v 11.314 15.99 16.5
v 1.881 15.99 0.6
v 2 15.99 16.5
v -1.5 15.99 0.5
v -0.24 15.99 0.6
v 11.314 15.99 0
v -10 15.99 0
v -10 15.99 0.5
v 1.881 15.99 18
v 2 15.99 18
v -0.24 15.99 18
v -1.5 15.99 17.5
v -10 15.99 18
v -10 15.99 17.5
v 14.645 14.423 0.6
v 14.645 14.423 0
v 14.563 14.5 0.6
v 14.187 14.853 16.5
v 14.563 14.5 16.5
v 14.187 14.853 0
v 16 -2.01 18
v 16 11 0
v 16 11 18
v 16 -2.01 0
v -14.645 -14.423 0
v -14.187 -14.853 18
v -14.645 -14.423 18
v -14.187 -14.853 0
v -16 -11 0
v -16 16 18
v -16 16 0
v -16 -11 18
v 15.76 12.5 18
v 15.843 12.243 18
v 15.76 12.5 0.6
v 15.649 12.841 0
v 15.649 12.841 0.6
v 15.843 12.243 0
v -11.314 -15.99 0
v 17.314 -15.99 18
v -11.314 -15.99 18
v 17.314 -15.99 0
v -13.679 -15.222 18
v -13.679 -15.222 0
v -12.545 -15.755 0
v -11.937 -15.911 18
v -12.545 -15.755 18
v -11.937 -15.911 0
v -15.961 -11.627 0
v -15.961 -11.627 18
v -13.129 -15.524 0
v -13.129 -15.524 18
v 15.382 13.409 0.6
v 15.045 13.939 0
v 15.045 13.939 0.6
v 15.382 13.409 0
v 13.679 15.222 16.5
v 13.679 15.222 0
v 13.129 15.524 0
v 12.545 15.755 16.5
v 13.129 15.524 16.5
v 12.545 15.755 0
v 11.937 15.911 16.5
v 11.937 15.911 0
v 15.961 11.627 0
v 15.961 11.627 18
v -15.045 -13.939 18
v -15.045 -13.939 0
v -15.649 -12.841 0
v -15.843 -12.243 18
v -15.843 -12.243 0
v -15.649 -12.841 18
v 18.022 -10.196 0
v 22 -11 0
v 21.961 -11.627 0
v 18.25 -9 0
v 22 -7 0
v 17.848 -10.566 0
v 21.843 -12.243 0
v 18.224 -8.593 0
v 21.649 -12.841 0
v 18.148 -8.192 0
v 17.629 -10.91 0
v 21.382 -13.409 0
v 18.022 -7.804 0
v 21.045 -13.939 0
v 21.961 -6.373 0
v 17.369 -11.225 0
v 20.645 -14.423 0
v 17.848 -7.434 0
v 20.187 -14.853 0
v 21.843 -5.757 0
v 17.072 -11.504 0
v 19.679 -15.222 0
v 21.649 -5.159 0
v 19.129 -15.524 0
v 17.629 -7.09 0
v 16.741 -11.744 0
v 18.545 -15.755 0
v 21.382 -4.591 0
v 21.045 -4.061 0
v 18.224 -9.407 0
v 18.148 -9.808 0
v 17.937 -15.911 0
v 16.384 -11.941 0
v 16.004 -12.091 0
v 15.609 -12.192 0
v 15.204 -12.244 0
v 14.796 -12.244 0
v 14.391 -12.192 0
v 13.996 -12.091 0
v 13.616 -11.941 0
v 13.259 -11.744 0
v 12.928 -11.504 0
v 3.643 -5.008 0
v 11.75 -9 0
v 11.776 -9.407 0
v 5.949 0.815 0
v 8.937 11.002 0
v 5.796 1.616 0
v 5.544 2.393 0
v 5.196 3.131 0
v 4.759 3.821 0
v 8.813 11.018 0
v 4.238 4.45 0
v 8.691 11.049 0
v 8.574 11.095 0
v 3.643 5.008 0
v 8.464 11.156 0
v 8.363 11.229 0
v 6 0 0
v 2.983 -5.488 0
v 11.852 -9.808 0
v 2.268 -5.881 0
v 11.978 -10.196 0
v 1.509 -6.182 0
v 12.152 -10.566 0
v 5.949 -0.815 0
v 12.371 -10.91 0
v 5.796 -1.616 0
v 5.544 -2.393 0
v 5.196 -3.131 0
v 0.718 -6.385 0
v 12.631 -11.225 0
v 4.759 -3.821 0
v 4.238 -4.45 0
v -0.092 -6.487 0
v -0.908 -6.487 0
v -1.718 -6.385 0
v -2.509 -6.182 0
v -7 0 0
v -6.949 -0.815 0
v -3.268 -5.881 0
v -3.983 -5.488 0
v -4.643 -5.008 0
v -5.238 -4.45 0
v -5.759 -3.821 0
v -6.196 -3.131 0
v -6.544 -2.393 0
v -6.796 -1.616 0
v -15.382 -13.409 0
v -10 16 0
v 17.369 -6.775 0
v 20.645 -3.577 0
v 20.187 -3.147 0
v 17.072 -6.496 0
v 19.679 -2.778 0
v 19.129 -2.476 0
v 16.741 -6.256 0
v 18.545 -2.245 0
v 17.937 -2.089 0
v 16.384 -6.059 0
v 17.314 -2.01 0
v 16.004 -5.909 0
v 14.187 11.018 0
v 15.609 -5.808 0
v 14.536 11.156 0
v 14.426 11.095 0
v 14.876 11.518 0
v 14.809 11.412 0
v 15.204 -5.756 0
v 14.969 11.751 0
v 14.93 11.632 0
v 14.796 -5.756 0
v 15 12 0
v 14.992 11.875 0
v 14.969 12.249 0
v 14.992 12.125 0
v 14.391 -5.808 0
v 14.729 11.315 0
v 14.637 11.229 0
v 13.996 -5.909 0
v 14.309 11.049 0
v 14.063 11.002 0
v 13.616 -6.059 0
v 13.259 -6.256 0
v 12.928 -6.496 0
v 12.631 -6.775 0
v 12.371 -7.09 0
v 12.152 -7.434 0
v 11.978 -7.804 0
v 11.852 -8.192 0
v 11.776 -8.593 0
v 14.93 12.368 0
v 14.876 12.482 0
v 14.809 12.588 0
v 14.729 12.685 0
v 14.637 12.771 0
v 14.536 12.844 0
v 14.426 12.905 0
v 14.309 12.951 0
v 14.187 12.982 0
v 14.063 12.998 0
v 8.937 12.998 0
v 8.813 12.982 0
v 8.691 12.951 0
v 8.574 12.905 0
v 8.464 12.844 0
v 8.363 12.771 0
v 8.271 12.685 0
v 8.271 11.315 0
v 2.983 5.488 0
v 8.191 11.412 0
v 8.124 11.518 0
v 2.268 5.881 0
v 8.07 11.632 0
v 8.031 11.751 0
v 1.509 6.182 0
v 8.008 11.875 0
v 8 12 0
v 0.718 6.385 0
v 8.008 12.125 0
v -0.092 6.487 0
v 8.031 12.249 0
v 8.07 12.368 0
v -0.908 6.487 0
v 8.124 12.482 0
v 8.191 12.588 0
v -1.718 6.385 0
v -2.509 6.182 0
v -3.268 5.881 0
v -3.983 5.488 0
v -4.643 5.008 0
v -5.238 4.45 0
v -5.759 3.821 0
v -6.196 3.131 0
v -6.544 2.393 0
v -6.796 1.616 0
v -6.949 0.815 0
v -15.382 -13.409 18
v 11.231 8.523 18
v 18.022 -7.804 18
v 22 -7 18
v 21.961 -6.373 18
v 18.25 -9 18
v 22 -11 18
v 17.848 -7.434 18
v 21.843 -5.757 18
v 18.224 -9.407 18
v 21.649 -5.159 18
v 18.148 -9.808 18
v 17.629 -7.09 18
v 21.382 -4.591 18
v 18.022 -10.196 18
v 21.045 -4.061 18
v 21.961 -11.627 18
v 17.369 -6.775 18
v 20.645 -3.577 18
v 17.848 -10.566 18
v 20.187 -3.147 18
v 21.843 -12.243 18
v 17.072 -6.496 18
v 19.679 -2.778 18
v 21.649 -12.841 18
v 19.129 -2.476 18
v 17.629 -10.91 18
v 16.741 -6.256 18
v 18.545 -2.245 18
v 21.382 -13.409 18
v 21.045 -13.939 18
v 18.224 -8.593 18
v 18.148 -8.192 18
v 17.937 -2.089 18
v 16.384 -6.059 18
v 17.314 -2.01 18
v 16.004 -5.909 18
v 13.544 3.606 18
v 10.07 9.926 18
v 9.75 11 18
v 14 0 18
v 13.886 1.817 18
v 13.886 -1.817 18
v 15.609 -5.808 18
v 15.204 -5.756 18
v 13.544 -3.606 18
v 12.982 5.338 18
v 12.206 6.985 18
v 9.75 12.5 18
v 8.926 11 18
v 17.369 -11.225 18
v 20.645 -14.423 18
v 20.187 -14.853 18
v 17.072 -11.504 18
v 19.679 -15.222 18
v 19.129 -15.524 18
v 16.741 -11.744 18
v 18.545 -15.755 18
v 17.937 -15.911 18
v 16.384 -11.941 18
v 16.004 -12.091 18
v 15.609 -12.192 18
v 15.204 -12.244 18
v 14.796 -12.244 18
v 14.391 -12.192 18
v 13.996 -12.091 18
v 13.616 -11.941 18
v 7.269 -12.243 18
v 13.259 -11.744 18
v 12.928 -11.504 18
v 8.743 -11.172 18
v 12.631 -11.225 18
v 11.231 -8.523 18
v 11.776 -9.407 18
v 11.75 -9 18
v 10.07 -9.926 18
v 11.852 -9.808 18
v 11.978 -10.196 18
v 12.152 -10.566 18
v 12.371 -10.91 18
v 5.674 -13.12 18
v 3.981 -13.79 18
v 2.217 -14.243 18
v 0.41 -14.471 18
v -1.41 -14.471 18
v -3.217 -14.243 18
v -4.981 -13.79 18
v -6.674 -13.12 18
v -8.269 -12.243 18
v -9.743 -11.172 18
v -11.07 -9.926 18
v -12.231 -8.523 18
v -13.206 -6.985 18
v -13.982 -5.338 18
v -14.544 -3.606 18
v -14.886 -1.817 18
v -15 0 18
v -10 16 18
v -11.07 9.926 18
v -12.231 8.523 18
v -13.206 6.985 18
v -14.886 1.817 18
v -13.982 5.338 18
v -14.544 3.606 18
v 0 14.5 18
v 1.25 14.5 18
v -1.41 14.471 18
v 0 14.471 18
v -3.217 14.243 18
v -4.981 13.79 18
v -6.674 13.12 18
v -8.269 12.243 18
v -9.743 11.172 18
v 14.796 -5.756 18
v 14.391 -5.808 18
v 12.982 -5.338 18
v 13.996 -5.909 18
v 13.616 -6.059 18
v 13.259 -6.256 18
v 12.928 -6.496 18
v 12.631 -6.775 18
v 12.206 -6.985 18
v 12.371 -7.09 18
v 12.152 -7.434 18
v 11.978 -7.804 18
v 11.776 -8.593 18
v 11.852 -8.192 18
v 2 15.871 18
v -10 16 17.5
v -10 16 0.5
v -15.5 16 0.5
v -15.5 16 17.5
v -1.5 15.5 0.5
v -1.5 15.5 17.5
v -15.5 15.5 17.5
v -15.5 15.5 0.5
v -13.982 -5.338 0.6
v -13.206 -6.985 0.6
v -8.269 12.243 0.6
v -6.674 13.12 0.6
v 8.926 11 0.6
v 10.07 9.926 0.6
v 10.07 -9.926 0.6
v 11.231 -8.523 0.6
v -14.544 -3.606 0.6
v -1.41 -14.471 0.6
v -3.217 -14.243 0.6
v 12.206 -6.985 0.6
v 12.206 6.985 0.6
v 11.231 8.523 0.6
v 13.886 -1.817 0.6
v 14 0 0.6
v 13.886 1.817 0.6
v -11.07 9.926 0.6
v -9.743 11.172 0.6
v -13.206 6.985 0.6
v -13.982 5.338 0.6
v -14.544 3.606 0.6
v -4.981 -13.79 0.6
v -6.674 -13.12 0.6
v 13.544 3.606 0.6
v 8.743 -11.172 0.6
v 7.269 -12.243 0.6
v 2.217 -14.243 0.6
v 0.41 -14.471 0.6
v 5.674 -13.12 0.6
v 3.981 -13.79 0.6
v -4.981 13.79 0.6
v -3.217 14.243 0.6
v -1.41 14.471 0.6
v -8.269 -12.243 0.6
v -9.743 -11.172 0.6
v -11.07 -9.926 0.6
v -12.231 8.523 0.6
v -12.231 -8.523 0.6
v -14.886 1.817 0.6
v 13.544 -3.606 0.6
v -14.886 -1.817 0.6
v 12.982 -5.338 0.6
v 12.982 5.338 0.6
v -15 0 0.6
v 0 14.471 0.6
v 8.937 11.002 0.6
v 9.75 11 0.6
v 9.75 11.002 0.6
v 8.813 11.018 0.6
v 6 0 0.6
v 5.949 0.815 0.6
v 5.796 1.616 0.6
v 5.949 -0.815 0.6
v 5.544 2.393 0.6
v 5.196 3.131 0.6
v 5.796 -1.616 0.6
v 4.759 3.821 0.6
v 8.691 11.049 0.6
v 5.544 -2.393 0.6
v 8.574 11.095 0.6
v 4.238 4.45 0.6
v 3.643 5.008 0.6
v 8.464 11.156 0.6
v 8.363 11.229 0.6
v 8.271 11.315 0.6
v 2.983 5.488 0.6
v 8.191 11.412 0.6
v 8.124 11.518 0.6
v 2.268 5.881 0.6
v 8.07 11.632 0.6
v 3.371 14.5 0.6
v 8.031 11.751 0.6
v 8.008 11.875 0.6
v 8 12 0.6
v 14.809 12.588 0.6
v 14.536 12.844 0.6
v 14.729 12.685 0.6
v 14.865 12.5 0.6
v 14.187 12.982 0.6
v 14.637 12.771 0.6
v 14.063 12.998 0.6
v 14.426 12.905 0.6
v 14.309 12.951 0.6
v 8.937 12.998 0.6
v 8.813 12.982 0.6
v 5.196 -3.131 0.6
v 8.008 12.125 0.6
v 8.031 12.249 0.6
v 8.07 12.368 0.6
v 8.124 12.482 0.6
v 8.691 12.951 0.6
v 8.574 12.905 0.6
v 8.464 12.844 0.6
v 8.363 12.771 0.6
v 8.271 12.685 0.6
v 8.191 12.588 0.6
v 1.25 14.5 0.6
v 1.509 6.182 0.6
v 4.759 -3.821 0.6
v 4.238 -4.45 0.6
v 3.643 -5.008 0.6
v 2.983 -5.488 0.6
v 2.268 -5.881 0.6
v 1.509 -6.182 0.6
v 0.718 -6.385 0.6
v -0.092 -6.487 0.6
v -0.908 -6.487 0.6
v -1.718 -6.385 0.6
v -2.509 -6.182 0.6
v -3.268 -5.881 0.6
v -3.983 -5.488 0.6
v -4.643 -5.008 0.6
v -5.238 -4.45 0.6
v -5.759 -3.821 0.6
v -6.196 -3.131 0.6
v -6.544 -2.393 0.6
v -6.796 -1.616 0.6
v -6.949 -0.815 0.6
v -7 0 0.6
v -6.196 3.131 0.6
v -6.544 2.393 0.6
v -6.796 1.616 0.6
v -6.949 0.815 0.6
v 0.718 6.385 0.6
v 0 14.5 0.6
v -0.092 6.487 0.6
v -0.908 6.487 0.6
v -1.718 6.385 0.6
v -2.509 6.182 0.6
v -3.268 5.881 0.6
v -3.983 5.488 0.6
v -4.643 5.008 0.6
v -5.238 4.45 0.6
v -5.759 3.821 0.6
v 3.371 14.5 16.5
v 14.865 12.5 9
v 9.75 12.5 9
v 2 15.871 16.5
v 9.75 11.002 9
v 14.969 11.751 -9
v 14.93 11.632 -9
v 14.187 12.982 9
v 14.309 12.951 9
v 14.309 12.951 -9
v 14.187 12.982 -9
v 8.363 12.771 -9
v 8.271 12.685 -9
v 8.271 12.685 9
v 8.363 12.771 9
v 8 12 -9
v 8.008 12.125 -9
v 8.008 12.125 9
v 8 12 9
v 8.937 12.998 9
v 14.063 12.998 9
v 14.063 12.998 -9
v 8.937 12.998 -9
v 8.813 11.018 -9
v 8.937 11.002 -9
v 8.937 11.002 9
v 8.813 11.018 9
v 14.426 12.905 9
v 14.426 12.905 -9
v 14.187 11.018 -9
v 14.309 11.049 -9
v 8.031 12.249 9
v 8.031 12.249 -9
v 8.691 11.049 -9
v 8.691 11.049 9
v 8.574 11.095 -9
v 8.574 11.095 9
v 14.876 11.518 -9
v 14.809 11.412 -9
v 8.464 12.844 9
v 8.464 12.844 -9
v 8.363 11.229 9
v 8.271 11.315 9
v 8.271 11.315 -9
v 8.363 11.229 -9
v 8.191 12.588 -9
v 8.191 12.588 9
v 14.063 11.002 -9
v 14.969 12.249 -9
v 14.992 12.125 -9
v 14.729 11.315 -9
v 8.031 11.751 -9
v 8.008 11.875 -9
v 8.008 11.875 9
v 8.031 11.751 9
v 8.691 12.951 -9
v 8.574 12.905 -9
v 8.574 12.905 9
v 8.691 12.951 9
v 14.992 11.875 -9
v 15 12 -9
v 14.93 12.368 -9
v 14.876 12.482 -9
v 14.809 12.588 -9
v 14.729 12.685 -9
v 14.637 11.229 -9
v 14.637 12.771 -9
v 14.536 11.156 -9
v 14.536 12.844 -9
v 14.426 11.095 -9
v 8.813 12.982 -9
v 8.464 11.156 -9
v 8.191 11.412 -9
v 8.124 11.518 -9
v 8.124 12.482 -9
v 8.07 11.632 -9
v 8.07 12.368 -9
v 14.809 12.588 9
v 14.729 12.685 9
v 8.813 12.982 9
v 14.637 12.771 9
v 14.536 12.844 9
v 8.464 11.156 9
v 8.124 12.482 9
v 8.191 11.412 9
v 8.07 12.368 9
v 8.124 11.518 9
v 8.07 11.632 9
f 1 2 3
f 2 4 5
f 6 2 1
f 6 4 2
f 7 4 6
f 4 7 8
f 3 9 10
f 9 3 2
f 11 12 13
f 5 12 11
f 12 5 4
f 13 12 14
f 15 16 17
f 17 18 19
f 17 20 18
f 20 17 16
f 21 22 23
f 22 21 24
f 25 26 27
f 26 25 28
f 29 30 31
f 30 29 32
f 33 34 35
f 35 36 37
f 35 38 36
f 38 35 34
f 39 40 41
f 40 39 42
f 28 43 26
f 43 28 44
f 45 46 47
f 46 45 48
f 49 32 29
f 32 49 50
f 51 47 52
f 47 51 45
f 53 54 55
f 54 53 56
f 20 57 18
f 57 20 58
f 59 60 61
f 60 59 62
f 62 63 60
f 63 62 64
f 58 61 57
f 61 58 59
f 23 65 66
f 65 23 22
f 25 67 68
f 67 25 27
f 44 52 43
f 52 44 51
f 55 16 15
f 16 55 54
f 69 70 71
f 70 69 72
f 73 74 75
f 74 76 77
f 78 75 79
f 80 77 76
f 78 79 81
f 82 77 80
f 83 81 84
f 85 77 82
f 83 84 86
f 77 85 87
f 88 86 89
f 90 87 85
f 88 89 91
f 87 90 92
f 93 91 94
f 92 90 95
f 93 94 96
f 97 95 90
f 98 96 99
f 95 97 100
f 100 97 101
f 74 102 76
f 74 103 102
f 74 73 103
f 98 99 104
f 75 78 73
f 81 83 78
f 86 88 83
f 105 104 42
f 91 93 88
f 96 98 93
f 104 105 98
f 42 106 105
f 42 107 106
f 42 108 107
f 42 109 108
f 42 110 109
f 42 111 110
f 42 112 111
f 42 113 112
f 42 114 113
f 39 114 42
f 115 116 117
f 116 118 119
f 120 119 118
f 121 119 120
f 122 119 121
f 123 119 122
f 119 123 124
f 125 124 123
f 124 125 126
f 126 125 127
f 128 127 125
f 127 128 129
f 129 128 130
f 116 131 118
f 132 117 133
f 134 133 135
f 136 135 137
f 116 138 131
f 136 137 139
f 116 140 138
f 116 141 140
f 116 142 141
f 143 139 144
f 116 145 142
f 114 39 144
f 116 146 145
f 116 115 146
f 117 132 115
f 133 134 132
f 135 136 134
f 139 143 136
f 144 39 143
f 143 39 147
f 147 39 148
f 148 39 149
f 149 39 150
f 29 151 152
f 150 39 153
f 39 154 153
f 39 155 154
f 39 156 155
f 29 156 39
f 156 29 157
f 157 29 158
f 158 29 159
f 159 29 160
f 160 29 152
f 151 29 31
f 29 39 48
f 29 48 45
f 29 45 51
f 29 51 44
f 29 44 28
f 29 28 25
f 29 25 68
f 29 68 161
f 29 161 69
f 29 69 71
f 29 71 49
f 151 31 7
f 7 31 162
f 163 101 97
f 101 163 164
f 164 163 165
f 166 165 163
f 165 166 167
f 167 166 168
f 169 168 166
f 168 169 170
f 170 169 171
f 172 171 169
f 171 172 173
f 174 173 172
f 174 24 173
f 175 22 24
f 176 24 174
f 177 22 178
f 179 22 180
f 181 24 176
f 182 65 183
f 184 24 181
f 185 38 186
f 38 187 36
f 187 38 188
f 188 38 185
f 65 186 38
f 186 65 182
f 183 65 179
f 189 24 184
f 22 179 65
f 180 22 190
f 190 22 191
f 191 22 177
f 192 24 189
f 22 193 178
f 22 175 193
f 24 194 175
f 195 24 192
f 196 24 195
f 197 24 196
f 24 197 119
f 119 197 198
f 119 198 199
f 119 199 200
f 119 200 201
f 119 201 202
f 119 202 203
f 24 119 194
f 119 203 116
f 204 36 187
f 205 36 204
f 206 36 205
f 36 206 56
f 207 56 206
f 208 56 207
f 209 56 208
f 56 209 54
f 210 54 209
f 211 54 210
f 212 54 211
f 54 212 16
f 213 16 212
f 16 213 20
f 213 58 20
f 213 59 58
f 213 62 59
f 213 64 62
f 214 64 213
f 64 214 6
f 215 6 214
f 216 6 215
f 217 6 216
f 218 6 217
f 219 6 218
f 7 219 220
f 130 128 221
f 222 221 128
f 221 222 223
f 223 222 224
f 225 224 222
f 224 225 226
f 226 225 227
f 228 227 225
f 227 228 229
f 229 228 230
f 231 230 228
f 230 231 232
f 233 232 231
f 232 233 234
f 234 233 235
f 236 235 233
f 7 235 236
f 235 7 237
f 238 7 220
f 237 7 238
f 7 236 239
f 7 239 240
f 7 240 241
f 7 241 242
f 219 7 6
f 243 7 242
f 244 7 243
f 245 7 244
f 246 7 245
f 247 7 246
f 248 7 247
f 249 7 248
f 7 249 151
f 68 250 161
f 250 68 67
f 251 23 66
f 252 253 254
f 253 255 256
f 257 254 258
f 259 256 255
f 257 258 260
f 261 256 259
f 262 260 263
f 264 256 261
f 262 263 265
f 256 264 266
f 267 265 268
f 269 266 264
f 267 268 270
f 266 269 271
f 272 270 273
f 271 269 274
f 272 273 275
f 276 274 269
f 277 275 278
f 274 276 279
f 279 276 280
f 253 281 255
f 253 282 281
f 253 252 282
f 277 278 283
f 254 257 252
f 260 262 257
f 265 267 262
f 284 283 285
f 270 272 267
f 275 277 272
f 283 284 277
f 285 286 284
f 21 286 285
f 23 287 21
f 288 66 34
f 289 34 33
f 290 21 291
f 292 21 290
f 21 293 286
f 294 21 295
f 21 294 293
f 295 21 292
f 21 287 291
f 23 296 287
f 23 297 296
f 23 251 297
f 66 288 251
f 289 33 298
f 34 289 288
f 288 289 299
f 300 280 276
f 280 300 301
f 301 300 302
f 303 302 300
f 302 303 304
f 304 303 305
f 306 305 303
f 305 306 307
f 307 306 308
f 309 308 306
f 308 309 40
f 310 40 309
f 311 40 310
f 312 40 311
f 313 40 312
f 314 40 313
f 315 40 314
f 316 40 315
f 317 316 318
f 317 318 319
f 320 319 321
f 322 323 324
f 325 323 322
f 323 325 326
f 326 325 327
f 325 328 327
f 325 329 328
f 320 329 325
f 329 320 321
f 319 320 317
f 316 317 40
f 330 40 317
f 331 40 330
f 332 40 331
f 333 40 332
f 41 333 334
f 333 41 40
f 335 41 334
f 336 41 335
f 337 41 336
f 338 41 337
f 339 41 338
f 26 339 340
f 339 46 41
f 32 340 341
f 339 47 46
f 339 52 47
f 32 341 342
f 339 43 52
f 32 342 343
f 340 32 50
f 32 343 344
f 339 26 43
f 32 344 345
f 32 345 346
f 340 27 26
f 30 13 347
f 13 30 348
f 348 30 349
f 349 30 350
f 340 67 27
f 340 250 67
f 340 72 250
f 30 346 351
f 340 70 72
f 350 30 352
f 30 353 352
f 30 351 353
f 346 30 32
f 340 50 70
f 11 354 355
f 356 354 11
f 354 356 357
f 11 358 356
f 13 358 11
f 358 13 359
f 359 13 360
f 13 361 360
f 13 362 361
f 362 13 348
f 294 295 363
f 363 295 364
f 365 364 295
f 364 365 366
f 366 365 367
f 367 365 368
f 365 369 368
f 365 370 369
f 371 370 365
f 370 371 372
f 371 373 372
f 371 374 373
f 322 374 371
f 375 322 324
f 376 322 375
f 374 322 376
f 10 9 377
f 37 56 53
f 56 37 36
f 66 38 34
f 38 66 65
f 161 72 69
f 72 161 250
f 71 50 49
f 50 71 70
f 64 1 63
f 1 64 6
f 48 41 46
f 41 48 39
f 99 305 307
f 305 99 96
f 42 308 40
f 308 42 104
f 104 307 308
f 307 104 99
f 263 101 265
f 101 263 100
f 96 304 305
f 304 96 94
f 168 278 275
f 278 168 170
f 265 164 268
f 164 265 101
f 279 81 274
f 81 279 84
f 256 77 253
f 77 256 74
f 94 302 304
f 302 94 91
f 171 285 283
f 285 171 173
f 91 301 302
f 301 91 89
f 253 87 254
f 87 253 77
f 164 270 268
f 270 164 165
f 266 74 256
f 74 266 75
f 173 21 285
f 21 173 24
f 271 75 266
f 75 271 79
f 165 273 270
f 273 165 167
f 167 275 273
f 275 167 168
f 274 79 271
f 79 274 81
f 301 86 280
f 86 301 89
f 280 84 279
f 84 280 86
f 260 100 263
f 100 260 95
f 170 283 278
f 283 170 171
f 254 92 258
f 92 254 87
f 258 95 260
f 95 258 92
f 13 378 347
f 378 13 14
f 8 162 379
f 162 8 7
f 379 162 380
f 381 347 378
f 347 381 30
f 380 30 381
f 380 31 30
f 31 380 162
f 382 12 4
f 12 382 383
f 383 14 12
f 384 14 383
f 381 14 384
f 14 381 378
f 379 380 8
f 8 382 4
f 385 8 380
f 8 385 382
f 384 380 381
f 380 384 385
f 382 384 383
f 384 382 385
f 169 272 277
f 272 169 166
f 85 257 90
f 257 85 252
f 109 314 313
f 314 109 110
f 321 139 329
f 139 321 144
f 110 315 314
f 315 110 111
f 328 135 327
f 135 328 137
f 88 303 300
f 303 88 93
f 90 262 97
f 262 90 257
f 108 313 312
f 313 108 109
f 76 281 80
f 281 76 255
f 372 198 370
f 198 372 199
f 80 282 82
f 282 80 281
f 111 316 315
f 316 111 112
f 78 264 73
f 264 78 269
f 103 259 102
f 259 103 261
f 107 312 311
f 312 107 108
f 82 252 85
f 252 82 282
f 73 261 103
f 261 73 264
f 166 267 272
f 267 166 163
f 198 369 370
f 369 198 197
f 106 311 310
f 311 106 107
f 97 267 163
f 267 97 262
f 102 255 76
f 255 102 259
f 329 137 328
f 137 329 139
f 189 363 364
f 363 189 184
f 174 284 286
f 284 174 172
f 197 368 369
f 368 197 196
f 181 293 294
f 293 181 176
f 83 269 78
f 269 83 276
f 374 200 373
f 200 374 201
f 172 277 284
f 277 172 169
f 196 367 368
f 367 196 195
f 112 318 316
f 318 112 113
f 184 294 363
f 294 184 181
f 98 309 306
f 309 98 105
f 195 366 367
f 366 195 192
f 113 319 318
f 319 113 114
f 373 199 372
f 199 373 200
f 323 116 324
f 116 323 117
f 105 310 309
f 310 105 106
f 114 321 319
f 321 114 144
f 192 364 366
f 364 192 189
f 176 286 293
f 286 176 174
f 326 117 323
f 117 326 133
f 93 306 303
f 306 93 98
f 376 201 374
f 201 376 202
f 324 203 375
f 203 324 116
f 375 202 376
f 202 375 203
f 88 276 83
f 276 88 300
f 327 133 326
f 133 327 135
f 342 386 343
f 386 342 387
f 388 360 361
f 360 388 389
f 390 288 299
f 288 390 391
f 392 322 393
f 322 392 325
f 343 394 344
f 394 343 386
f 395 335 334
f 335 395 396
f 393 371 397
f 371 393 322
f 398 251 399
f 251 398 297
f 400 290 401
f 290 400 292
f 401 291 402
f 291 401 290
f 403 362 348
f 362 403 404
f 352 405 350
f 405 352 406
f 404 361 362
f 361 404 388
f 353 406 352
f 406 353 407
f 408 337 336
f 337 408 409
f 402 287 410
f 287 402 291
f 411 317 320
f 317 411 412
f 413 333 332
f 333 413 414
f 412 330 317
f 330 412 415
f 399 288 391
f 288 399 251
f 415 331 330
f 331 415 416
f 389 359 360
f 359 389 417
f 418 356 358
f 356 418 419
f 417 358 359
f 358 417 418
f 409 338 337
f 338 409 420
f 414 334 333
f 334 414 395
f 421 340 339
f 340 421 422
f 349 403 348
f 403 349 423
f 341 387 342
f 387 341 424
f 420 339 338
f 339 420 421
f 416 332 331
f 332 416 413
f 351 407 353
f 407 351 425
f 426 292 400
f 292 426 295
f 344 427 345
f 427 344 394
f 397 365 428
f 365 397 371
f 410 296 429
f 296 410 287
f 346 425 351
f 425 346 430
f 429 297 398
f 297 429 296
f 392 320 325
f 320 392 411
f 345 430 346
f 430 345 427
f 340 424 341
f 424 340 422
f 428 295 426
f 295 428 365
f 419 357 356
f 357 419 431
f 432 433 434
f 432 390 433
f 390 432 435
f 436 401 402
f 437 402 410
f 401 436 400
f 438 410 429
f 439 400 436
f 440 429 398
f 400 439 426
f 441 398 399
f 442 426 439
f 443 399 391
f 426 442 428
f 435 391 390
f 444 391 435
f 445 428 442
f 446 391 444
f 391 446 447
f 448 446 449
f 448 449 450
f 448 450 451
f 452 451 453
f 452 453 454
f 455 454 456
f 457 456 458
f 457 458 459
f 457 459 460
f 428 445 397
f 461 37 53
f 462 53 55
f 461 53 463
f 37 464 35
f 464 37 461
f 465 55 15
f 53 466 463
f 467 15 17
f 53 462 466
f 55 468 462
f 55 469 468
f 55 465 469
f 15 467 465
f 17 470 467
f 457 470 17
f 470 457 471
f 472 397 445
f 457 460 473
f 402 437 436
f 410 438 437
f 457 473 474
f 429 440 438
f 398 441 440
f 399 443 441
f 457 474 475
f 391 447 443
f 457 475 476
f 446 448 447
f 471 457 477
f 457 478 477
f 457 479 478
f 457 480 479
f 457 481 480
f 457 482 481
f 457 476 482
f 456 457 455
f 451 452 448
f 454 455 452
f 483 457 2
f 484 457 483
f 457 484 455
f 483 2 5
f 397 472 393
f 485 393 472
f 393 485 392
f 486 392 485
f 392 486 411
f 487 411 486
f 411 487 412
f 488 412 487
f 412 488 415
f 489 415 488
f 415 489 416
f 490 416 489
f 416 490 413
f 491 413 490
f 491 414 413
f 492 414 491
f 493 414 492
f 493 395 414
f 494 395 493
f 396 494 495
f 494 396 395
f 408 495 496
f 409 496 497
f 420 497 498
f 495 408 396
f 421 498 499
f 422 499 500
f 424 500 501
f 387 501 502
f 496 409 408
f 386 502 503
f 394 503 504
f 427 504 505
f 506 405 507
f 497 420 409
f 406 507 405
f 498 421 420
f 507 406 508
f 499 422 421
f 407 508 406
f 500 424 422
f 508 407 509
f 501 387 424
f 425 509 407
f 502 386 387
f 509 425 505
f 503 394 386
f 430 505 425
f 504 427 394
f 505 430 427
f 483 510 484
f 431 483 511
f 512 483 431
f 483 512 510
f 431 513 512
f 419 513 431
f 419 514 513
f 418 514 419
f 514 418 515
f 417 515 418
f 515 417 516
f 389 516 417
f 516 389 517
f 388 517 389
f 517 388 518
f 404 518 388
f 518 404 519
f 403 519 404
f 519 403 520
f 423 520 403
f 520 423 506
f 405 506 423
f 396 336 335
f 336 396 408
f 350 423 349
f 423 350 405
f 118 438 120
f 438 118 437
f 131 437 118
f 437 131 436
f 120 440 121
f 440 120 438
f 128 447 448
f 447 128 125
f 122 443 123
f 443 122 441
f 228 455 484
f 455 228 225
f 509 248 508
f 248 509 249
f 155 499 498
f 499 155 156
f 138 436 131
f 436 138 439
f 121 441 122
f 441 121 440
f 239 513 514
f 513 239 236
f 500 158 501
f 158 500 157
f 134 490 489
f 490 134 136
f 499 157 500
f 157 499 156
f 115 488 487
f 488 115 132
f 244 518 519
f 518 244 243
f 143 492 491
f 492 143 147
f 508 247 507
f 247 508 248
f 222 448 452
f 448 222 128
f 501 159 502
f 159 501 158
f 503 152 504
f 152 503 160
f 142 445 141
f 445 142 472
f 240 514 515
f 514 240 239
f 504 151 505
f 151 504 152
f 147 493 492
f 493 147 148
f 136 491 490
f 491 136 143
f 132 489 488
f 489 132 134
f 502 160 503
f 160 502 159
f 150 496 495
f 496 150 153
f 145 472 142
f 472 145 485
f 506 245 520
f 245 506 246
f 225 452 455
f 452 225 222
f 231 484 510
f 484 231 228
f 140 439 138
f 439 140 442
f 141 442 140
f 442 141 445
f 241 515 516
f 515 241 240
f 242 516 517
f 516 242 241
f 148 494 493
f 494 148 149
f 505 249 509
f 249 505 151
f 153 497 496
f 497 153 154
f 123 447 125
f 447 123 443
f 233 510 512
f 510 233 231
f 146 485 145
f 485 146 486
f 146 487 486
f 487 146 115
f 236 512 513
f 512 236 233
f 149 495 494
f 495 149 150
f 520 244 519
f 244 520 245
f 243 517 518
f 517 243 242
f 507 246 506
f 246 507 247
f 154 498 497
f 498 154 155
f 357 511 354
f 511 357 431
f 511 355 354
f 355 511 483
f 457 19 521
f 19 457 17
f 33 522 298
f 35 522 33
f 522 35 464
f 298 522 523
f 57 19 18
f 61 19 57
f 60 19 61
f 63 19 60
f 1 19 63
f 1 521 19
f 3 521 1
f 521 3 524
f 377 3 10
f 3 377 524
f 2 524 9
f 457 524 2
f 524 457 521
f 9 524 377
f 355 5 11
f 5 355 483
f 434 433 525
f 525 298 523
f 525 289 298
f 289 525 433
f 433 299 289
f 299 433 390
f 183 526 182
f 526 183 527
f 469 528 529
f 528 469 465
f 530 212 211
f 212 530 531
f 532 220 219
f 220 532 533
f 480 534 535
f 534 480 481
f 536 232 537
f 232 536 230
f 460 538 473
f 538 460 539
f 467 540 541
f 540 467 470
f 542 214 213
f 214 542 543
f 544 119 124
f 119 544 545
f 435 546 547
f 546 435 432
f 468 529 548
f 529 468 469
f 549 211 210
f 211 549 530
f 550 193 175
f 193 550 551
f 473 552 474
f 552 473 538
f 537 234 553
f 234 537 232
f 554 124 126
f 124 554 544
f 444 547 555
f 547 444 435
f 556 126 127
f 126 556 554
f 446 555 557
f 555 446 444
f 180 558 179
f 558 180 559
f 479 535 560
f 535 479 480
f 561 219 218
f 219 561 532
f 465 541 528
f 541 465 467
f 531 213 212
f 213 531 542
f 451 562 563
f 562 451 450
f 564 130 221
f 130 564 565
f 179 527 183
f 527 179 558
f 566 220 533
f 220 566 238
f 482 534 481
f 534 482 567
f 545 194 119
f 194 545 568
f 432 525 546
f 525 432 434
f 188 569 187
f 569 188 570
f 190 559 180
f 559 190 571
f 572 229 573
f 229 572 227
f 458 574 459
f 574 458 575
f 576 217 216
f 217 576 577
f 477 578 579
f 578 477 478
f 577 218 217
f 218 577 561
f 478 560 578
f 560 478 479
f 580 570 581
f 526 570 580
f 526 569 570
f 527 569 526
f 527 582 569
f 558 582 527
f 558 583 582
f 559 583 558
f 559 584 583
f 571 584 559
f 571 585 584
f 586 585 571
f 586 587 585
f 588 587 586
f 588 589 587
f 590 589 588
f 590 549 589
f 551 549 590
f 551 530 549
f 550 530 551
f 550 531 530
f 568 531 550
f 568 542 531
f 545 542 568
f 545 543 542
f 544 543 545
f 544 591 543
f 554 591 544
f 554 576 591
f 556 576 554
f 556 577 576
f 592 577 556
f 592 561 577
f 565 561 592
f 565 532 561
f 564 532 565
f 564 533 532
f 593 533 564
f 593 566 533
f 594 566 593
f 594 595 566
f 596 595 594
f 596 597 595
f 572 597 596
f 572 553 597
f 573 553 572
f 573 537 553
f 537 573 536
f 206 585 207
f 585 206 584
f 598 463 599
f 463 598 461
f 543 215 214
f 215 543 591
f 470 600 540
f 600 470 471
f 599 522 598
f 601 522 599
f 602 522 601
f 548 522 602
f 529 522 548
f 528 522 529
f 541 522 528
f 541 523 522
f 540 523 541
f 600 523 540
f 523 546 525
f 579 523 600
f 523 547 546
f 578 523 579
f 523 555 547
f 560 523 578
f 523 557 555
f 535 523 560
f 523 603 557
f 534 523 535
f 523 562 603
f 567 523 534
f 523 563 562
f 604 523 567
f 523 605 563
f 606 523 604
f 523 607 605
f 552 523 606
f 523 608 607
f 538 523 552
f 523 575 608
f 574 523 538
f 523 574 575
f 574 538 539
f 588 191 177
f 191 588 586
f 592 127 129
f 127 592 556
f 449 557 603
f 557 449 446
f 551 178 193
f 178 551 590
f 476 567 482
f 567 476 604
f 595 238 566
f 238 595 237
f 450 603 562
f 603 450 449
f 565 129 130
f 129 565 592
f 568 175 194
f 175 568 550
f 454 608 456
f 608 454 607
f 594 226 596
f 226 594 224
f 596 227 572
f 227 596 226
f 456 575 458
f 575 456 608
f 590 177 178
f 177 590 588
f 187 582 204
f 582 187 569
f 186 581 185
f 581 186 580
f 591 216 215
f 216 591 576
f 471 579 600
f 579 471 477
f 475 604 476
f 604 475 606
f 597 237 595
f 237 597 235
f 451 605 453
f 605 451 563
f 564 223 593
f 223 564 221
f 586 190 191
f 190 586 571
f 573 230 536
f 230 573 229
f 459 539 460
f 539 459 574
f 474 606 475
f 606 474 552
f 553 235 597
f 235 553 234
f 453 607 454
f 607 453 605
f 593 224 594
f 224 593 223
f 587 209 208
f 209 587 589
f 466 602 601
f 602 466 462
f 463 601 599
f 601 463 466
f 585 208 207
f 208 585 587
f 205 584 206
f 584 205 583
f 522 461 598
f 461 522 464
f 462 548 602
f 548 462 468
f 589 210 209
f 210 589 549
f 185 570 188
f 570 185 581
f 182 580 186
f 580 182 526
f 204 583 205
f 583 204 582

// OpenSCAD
$fn = 50;


union() {
	difference() {
		union() {
			hull() {
				translate(v = [-11.0000000000, 11.0000000000, 0]) {
					cylinder(h = 18, r = 5);
				}
				translate(v = [11.0000000000, 11.0000000000, 0]) {
					cylinder(h = 18, r = 5);
				}
				translate(v = [-11.0000000000, -11.0000000000, 0]) {
					cylinder(h = 18, r = 5);
				}
				translate(v = [11.0000000000, -11.0000000000, 0]) {
					cylinder(h = 18, r = 5);
				}
			}
			translate(v = [7.5000000000, -9.0000000000, 0]) {
				hull() {
					translate(v = [-9.5000000000, 2.0000000000, 0]) {
						cylinder(h = 18, r = 5);
					}
					translate(v = [9.5000000000, 2.0000000000, 0]) {
						cylinder(h = 18, r = 5);
					}
					translate(v = [-9.5000000000, -2.0000000000, 0]) {
						cylinder(h = 18, r = 5);
					}
					translate(v = [9.5000000000, -2.0000000000, 0]) {
						cylinder(h = 18, r = 5);
					}
				}
			}
			translate(v = [-16.0000000000, 10.0000000000, 0]) {
				cube(size = [6, 6, 18]);
			}
		}
		union() {
			translate(v = [-15.5000000000, 15.5000000000, 0.5000000000]) {
				cube(size = [14, 0.5000000000, 17.0000000000]);
			}
			translate(v = [15.0000000000, -9.0000000000, -100.0000000000]) {
				cylinder(h = 200, r = 3.2500000000);
			}
			translate(v = [-0.5000000000, 0.0000000000, 0.6000000000]) {
				cylinder(h = 20.4000000000, r = 14.5000000000);
			}
			translate(v = [-0.5000000000, 0.0000000000, -9.0000000000]) {
				cylinder(h = 18, r = 6.5000000000);
			}
			translate(v = [0.0000000000, 12.5000000000, 0.6000000000]) {
				cube(size = [16.0000000000, 2, 20.4000000000]);
			}
			translate(v = [2.0000000000, 12.5000000000, 16.5000000000]) {
				cube(size = [14.0000000000, 5, 1.5000000000]);
			}
			translate(v = [-3.0000000000, 18.7500000000, 0.6000000000]) {
				rotate(a = [0, 0, -45]) {
					cube(size = [10, 1.5000000000, 20.4000000000]);
				}
			}
			translate(v = [2.2500000000, 11.0000000000, 0.6000000000]) {
				cube(size = [7.5000000000, 2, 17.4000000000]);
			}
		}
	}
	union() {
		translate(v = [11.5000000000, 12, -9.0000000000]) {
			rotate(a = [0, 0, 0]) {
				difference() {
					union() {
						hull() {
							translate(v = [2.5000000000, 0, 0]) {
								cylinder(h = 18, r = 1.0000000000, r1 = 1.0000000000, r2 = 1.0000000000);
							}
							translate(v = [-2.5000000000, 0, 0]) {
								cylinder(h = 18, r = 1.0000000000, r1 = 1.0000000000, r2 = 1.0000000000);
							}
						}
					}
					union();
				}
			}
		}
	}
}
